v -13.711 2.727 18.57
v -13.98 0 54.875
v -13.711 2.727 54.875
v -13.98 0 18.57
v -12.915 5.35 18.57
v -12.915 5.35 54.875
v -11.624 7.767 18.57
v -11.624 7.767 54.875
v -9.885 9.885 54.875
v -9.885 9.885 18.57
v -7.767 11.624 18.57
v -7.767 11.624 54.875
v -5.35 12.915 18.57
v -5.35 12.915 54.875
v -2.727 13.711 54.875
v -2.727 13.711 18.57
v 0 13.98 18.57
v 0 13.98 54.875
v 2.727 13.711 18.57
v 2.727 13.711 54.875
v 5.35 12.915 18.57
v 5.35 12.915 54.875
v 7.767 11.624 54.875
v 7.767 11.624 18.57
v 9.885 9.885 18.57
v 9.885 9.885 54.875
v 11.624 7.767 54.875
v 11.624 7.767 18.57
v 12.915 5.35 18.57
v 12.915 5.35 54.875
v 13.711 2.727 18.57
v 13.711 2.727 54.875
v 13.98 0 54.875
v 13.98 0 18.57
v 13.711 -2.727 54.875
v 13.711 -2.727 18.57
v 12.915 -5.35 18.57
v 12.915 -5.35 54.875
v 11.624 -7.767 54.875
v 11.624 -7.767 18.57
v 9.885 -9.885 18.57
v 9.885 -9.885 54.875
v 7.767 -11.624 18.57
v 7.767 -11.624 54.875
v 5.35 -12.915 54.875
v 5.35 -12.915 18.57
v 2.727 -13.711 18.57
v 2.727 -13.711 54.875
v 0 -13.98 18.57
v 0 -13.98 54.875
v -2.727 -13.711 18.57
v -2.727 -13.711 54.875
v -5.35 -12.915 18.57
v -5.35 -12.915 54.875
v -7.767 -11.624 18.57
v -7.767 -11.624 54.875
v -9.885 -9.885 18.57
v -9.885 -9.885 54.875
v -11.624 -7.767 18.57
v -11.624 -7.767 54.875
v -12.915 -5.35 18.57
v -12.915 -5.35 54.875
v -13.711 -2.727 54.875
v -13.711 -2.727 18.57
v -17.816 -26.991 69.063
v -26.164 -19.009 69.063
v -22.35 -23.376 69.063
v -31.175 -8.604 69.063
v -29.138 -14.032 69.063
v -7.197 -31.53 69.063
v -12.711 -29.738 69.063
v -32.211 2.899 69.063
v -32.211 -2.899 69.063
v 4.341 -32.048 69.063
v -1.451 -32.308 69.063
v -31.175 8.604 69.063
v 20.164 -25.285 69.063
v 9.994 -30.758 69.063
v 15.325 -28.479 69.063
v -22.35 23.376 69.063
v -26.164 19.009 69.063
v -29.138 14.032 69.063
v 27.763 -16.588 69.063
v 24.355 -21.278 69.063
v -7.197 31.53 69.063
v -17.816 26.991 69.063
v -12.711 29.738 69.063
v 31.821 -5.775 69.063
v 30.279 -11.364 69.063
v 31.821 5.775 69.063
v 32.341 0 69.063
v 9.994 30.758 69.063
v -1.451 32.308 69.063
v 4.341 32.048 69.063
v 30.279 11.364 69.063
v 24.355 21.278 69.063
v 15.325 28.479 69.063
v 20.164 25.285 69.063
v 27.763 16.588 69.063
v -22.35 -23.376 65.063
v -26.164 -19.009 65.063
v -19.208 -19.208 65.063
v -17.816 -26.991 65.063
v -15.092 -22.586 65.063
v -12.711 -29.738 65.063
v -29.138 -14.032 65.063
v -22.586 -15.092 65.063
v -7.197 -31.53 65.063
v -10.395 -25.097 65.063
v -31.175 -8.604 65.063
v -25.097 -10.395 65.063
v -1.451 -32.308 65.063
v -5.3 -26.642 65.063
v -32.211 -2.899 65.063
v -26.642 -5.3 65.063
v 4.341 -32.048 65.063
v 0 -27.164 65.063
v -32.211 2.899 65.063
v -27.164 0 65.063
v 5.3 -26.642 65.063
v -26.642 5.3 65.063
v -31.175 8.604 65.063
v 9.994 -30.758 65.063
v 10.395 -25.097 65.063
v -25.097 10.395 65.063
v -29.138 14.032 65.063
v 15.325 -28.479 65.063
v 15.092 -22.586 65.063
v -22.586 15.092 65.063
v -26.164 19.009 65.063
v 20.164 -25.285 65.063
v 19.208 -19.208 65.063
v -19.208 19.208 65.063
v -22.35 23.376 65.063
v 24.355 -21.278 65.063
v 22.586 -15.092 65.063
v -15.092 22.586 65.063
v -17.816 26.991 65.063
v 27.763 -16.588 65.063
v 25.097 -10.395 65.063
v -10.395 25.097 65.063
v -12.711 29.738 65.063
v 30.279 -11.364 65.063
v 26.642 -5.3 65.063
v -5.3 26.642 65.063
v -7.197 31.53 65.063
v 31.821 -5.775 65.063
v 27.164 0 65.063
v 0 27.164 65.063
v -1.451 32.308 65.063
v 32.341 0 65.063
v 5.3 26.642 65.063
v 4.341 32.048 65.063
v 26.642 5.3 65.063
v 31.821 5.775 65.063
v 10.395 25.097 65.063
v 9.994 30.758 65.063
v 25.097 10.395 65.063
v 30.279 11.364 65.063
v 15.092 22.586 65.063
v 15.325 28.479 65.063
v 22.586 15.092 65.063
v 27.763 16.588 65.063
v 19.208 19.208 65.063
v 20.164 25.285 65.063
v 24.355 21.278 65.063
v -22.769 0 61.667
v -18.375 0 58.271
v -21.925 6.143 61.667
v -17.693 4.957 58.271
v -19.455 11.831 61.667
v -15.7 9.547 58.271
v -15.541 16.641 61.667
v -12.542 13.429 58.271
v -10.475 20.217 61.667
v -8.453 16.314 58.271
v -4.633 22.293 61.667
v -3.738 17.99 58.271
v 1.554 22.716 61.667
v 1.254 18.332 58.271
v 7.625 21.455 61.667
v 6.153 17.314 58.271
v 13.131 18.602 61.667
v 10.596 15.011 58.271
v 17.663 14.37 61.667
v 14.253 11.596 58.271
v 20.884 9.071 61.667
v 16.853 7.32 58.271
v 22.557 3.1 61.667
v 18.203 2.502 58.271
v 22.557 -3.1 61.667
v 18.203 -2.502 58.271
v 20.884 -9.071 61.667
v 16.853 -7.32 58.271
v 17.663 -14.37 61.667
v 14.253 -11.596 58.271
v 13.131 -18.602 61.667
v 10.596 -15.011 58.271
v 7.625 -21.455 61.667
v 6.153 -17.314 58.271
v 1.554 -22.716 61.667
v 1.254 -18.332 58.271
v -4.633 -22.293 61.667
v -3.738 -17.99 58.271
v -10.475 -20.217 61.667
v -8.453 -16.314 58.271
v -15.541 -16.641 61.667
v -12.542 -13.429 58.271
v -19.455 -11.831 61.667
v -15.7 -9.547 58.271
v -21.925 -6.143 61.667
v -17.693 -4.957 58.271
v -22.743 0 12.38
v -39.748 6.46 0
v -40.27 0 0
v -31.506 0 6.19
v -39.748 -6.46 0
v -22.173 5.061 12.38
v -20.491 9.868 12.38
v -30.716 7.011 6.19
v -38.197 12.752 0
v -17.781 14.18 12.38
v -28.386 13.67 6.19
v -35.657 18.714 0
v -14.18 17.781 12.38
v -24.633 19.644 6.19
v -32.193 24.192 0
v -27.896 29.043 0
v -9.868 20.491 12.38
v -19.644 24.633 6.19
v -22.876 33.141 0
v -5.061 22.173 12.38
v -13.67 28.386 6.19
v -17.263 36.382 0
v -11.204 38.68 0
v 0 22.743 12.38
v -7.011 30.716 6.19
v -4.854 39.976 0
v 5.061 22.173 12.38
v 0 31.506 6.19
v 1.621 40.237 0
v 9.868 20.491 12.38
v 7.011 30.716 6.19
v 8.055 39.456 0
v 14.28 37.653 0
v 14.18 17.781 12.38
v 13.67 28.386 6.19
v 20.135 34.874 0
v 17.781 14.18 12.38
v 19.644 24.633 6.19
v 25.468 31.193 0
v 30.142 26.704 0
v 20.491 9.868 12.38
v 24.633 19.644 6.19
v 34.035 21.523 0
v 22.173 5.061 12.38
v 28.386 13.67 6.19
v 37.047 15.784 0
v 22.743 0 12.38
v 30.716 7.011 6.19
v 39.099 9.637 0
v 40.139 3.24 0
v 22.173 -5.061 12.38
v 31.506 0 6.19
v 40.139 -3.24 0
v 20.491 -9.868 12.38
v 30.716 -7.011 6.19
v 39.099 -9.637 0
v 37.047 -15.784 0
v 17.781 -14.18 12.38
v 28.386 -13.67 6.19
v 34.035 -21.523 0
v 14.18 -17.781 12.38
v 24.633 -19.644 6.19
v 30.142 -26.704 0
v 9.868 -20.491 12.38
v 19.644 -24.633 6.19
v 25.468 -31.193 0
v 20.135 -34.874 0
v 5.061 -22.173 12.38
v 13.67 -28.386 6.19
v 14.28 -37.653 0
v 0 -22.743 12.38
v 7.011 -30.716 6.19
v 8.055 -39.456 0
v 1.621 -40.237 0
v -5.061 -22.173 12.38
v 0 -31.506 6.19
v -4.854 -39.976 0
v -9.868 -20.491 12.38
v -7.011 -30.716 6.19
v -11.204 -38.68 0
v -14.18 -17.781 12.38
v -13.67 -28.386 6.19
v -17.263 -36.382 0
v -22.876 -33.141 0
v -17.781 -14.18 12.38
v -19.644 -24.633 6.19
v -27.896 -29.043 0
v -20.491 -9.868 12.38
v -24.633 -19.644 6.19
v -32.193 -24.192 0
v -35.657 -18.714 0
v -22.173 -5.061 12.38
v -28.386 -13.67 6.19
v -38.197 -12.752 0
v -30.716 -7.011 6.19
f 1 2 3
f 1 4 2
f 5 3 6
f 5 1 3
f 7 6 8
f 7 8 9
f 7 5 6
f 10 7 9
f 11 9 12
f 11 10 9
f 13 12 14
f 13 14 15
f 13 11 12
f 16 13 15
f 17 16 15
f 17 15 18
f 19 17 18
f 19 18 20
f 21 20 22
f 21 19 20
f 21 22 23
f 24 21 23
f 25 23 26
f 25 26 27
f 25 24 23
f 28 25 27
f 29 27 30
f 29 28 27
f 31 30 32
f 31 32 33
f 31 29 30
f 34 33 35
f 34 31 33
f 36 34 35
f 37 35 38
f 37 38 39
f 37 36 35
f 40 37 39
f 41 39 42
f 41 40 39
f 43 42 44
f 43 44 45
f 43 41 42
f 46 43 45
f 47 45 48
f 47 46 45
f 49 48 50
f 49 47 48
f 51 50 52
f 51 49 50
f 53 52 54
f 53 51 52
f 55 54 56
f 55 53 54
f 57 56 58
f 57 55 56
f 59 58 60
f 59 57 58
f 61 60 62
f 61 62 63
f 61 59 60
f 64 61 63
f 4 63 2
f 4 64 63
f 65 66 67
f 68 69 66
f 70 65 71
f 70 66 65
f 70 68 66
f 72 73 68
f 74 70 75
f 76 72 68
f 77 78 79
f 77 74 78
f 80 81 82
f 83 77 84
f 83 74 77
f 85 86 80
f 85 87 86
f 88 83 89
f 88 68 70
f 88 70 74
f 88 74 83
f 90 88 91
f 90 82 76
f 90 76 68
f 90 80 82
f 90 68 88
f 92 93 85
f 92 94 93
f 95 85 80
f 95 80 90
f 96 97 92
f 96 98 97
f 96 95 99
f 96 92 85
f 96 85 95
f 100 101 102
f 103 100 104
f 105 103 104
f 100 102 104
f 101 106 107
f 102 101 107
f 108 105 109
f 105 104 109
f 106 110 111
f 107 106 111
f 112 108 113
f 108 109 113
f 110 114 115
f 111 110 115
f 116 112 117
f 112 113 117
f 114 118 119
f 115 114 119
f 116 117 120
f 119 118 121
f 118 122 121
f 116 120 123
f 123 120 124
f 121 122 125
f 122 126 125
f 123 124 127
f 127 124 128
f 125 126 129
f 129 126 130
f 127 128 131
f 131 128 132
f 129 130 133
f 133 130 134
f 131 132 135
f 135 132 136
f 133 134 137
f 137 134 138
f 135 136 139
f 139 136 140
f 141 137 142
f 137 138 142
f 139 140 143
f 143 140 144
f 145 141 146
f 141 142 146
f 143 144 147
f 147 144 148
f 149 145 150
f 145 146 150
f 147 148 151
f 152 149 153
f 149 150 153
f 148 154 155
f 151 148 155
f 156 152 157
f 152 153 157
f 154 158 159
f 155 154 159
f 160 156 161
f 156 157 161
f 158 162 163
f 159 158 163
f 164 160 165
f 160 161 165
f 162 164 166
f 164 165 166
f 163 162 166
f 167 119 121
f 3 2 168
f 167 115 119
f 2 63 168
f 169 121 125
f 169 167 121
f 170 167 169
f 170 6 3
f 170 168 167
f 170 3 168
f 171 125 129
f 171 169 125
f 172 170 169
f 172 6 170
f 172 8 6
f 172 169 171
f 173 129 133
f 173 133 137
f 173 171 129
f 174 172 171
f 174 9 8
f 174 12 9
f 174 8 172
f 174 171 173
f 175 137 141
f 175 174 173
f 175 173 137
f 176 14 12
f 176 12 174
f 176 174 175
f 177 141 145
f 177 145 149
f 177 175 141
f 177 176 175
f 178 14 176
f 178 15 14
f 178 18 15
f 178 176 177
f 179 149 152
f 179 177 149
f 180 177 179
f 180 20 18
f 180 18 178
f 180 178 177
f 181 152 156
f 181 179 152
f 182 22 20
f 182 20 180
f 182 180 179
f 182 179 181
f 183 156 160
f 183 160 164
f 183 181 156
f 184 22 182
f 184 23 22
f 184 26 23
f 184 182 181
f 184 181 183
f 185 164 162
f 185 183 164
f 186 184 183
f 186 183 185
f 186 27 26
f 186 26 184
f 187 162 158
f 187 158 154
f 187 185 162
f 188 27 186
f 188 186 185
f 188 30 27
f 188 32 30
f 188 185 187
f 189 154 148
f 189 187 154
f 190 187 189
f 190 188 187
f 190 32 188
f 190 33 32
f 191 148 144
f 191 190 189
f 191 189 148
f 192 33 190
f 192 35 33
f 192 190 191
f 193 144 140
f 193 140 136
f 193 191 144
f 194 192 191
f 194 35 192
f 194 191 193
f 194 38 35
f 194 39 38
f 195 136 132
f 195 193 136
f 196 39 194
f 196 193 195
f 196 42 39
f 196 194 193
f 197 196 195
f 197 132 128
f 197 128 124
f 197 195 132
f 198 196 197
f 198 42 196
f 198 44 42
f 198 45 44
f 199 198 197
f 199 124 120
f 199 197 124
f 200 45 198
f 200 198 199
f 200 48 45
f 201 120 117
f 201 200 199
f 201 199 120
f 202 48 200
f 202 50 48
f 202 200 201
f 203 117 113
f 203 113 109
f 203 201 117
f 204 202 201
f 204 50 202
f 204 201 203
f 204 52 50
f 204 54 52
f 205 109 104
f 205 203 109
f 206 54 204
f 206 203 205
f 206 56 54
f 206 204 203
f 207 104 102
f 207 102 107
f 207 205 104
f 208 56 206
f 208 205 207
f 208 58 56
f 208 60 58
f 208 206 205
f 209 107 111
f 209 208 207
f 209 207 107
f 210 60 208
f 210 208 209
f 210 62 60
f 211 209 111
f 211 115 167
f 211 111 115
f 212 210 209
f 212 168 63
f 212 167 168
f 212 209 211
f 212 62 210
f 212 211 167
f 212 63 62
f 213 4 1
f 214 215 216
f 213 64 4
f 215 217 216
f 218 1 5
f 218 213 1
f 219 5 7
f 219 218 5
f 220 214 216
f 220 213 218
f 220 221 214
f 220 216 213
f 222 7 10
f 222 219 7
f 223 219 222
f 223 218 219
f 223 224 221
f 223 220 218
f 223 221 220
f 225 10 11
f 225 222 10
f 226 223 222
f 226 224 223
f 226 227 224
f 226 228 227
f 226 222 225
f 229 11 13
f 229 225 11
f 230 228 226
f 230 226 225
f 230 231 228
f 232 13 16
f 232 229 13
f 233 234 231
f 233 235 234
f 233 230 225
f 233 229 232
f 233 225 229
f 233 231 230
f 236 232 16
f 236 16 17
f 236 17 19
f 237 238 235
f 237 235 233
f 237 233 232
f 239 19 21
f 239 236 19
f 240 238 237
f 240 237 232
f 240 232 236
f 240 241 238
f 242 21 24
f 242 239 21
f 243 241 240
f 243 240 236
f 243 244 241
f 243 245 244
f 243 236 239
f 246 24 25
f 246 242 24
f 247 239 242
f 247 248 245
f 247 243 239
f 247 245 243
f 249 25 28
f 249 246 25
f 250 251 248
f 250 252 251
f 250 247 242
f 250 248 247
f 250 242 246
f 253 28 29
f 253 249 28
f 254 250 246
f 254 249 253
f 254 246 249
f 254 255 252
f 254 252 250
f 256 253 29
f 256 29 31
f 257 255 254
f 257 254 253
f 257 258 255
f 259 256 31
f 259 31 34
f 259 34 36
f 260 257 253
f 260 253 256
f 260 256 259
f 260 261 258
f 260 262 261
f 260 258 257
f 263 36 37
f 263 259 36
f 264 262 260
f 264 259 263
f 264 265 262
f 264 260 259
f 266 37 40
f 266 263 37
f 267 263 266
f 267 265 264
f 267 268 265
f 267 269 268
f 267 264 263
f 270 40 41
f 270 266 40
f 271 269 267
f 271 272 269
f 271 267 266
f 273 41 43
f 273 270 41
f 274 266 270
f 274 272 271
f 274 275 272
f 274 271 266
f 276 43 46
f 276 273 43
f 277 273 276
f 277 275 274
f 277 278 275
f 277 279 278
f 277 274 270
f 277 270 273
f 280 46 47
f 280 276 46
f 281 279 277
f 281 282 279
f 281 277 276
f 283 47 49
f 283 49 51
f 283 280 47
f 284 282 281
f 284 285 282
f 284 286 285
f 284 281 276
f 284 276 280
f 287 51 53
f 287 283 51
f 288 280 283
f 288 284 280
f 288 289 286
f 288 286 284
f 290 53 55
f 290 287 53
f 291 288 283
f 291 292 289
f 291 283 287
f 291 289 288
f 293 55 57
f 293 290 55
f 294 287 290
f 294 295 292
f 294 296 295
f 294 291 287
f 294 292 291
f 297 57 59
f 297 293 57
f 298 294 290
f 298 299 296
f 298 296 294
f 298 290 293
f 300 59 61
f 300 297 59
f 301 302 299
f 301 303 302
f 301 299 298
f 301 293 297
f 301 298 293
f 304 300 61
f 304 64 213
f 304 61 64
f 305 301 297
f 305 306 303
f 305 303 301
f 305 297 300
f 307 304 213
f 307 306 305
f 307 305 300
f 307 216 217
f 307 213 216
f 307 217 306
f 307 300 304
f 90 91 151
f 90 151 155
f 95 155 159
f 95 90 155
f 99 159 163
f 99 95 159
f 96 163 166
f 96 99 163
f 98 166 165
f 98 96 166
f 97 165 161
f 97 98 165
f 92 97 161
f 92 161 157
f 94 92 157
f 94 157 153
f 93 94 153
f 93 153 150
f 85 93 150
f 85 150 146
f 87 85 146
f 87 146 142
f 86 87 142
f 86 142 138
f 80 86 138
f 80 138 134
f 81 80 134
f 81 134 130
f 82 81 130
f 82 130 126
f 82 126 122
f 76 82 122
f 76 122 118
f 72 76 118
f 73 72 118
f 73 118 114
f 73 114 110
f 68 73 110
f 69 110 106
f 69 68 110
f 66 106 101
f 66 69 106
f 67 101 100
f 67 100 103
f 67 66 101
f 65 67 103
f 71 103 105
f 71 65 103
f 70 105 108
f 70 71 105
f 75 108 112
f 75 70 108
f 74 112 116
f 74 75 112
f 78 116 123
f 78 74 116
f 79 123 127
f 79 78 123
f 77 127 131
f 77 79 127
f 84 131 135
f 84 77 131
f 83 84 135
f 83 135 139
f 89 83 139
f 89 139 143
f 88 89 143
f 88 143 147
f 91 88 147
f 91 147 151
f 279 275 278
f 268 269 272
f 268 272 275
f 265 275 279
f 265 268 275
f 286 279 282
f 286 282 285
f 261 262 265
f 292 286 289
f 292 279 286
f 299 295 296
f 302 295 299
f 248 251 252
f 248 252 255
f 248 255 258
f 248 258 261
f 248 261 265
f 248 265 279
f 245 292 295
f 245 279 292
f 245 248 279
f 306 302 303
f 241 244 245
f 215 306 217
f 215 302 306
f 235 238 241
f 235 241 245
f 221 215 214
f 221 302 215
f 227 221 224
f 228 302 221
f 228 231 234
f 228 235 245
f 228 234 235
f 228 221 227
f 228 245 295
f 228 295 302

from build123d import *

# Parameters (mm, degrees)
F1_FACE_R = 32.340866
F2_DEPTH  = 4


with BuildPart() as f1:
    # F0 (on Front) → F1 (revolve)
    with BuildSketch(Plane.XZ):
        Polygon((-13.979599, 18.569916), (-40.269591, 0), (0, 0), (0, 69.063395), (-32.340866, 69.063395), (-13.979599, 54.875147), align=None)
    revolve(axis=Axis((0, 0, 34.531698), (0, 0, -1)))

    # F1_face (on face) → F2 (join)
    with BuildSketch(Plane.XY.offset(69.063395)):
        Circle(F1_FACE_R)
    extrude(amount=-F2_DEPTH)


solid = f1.part
